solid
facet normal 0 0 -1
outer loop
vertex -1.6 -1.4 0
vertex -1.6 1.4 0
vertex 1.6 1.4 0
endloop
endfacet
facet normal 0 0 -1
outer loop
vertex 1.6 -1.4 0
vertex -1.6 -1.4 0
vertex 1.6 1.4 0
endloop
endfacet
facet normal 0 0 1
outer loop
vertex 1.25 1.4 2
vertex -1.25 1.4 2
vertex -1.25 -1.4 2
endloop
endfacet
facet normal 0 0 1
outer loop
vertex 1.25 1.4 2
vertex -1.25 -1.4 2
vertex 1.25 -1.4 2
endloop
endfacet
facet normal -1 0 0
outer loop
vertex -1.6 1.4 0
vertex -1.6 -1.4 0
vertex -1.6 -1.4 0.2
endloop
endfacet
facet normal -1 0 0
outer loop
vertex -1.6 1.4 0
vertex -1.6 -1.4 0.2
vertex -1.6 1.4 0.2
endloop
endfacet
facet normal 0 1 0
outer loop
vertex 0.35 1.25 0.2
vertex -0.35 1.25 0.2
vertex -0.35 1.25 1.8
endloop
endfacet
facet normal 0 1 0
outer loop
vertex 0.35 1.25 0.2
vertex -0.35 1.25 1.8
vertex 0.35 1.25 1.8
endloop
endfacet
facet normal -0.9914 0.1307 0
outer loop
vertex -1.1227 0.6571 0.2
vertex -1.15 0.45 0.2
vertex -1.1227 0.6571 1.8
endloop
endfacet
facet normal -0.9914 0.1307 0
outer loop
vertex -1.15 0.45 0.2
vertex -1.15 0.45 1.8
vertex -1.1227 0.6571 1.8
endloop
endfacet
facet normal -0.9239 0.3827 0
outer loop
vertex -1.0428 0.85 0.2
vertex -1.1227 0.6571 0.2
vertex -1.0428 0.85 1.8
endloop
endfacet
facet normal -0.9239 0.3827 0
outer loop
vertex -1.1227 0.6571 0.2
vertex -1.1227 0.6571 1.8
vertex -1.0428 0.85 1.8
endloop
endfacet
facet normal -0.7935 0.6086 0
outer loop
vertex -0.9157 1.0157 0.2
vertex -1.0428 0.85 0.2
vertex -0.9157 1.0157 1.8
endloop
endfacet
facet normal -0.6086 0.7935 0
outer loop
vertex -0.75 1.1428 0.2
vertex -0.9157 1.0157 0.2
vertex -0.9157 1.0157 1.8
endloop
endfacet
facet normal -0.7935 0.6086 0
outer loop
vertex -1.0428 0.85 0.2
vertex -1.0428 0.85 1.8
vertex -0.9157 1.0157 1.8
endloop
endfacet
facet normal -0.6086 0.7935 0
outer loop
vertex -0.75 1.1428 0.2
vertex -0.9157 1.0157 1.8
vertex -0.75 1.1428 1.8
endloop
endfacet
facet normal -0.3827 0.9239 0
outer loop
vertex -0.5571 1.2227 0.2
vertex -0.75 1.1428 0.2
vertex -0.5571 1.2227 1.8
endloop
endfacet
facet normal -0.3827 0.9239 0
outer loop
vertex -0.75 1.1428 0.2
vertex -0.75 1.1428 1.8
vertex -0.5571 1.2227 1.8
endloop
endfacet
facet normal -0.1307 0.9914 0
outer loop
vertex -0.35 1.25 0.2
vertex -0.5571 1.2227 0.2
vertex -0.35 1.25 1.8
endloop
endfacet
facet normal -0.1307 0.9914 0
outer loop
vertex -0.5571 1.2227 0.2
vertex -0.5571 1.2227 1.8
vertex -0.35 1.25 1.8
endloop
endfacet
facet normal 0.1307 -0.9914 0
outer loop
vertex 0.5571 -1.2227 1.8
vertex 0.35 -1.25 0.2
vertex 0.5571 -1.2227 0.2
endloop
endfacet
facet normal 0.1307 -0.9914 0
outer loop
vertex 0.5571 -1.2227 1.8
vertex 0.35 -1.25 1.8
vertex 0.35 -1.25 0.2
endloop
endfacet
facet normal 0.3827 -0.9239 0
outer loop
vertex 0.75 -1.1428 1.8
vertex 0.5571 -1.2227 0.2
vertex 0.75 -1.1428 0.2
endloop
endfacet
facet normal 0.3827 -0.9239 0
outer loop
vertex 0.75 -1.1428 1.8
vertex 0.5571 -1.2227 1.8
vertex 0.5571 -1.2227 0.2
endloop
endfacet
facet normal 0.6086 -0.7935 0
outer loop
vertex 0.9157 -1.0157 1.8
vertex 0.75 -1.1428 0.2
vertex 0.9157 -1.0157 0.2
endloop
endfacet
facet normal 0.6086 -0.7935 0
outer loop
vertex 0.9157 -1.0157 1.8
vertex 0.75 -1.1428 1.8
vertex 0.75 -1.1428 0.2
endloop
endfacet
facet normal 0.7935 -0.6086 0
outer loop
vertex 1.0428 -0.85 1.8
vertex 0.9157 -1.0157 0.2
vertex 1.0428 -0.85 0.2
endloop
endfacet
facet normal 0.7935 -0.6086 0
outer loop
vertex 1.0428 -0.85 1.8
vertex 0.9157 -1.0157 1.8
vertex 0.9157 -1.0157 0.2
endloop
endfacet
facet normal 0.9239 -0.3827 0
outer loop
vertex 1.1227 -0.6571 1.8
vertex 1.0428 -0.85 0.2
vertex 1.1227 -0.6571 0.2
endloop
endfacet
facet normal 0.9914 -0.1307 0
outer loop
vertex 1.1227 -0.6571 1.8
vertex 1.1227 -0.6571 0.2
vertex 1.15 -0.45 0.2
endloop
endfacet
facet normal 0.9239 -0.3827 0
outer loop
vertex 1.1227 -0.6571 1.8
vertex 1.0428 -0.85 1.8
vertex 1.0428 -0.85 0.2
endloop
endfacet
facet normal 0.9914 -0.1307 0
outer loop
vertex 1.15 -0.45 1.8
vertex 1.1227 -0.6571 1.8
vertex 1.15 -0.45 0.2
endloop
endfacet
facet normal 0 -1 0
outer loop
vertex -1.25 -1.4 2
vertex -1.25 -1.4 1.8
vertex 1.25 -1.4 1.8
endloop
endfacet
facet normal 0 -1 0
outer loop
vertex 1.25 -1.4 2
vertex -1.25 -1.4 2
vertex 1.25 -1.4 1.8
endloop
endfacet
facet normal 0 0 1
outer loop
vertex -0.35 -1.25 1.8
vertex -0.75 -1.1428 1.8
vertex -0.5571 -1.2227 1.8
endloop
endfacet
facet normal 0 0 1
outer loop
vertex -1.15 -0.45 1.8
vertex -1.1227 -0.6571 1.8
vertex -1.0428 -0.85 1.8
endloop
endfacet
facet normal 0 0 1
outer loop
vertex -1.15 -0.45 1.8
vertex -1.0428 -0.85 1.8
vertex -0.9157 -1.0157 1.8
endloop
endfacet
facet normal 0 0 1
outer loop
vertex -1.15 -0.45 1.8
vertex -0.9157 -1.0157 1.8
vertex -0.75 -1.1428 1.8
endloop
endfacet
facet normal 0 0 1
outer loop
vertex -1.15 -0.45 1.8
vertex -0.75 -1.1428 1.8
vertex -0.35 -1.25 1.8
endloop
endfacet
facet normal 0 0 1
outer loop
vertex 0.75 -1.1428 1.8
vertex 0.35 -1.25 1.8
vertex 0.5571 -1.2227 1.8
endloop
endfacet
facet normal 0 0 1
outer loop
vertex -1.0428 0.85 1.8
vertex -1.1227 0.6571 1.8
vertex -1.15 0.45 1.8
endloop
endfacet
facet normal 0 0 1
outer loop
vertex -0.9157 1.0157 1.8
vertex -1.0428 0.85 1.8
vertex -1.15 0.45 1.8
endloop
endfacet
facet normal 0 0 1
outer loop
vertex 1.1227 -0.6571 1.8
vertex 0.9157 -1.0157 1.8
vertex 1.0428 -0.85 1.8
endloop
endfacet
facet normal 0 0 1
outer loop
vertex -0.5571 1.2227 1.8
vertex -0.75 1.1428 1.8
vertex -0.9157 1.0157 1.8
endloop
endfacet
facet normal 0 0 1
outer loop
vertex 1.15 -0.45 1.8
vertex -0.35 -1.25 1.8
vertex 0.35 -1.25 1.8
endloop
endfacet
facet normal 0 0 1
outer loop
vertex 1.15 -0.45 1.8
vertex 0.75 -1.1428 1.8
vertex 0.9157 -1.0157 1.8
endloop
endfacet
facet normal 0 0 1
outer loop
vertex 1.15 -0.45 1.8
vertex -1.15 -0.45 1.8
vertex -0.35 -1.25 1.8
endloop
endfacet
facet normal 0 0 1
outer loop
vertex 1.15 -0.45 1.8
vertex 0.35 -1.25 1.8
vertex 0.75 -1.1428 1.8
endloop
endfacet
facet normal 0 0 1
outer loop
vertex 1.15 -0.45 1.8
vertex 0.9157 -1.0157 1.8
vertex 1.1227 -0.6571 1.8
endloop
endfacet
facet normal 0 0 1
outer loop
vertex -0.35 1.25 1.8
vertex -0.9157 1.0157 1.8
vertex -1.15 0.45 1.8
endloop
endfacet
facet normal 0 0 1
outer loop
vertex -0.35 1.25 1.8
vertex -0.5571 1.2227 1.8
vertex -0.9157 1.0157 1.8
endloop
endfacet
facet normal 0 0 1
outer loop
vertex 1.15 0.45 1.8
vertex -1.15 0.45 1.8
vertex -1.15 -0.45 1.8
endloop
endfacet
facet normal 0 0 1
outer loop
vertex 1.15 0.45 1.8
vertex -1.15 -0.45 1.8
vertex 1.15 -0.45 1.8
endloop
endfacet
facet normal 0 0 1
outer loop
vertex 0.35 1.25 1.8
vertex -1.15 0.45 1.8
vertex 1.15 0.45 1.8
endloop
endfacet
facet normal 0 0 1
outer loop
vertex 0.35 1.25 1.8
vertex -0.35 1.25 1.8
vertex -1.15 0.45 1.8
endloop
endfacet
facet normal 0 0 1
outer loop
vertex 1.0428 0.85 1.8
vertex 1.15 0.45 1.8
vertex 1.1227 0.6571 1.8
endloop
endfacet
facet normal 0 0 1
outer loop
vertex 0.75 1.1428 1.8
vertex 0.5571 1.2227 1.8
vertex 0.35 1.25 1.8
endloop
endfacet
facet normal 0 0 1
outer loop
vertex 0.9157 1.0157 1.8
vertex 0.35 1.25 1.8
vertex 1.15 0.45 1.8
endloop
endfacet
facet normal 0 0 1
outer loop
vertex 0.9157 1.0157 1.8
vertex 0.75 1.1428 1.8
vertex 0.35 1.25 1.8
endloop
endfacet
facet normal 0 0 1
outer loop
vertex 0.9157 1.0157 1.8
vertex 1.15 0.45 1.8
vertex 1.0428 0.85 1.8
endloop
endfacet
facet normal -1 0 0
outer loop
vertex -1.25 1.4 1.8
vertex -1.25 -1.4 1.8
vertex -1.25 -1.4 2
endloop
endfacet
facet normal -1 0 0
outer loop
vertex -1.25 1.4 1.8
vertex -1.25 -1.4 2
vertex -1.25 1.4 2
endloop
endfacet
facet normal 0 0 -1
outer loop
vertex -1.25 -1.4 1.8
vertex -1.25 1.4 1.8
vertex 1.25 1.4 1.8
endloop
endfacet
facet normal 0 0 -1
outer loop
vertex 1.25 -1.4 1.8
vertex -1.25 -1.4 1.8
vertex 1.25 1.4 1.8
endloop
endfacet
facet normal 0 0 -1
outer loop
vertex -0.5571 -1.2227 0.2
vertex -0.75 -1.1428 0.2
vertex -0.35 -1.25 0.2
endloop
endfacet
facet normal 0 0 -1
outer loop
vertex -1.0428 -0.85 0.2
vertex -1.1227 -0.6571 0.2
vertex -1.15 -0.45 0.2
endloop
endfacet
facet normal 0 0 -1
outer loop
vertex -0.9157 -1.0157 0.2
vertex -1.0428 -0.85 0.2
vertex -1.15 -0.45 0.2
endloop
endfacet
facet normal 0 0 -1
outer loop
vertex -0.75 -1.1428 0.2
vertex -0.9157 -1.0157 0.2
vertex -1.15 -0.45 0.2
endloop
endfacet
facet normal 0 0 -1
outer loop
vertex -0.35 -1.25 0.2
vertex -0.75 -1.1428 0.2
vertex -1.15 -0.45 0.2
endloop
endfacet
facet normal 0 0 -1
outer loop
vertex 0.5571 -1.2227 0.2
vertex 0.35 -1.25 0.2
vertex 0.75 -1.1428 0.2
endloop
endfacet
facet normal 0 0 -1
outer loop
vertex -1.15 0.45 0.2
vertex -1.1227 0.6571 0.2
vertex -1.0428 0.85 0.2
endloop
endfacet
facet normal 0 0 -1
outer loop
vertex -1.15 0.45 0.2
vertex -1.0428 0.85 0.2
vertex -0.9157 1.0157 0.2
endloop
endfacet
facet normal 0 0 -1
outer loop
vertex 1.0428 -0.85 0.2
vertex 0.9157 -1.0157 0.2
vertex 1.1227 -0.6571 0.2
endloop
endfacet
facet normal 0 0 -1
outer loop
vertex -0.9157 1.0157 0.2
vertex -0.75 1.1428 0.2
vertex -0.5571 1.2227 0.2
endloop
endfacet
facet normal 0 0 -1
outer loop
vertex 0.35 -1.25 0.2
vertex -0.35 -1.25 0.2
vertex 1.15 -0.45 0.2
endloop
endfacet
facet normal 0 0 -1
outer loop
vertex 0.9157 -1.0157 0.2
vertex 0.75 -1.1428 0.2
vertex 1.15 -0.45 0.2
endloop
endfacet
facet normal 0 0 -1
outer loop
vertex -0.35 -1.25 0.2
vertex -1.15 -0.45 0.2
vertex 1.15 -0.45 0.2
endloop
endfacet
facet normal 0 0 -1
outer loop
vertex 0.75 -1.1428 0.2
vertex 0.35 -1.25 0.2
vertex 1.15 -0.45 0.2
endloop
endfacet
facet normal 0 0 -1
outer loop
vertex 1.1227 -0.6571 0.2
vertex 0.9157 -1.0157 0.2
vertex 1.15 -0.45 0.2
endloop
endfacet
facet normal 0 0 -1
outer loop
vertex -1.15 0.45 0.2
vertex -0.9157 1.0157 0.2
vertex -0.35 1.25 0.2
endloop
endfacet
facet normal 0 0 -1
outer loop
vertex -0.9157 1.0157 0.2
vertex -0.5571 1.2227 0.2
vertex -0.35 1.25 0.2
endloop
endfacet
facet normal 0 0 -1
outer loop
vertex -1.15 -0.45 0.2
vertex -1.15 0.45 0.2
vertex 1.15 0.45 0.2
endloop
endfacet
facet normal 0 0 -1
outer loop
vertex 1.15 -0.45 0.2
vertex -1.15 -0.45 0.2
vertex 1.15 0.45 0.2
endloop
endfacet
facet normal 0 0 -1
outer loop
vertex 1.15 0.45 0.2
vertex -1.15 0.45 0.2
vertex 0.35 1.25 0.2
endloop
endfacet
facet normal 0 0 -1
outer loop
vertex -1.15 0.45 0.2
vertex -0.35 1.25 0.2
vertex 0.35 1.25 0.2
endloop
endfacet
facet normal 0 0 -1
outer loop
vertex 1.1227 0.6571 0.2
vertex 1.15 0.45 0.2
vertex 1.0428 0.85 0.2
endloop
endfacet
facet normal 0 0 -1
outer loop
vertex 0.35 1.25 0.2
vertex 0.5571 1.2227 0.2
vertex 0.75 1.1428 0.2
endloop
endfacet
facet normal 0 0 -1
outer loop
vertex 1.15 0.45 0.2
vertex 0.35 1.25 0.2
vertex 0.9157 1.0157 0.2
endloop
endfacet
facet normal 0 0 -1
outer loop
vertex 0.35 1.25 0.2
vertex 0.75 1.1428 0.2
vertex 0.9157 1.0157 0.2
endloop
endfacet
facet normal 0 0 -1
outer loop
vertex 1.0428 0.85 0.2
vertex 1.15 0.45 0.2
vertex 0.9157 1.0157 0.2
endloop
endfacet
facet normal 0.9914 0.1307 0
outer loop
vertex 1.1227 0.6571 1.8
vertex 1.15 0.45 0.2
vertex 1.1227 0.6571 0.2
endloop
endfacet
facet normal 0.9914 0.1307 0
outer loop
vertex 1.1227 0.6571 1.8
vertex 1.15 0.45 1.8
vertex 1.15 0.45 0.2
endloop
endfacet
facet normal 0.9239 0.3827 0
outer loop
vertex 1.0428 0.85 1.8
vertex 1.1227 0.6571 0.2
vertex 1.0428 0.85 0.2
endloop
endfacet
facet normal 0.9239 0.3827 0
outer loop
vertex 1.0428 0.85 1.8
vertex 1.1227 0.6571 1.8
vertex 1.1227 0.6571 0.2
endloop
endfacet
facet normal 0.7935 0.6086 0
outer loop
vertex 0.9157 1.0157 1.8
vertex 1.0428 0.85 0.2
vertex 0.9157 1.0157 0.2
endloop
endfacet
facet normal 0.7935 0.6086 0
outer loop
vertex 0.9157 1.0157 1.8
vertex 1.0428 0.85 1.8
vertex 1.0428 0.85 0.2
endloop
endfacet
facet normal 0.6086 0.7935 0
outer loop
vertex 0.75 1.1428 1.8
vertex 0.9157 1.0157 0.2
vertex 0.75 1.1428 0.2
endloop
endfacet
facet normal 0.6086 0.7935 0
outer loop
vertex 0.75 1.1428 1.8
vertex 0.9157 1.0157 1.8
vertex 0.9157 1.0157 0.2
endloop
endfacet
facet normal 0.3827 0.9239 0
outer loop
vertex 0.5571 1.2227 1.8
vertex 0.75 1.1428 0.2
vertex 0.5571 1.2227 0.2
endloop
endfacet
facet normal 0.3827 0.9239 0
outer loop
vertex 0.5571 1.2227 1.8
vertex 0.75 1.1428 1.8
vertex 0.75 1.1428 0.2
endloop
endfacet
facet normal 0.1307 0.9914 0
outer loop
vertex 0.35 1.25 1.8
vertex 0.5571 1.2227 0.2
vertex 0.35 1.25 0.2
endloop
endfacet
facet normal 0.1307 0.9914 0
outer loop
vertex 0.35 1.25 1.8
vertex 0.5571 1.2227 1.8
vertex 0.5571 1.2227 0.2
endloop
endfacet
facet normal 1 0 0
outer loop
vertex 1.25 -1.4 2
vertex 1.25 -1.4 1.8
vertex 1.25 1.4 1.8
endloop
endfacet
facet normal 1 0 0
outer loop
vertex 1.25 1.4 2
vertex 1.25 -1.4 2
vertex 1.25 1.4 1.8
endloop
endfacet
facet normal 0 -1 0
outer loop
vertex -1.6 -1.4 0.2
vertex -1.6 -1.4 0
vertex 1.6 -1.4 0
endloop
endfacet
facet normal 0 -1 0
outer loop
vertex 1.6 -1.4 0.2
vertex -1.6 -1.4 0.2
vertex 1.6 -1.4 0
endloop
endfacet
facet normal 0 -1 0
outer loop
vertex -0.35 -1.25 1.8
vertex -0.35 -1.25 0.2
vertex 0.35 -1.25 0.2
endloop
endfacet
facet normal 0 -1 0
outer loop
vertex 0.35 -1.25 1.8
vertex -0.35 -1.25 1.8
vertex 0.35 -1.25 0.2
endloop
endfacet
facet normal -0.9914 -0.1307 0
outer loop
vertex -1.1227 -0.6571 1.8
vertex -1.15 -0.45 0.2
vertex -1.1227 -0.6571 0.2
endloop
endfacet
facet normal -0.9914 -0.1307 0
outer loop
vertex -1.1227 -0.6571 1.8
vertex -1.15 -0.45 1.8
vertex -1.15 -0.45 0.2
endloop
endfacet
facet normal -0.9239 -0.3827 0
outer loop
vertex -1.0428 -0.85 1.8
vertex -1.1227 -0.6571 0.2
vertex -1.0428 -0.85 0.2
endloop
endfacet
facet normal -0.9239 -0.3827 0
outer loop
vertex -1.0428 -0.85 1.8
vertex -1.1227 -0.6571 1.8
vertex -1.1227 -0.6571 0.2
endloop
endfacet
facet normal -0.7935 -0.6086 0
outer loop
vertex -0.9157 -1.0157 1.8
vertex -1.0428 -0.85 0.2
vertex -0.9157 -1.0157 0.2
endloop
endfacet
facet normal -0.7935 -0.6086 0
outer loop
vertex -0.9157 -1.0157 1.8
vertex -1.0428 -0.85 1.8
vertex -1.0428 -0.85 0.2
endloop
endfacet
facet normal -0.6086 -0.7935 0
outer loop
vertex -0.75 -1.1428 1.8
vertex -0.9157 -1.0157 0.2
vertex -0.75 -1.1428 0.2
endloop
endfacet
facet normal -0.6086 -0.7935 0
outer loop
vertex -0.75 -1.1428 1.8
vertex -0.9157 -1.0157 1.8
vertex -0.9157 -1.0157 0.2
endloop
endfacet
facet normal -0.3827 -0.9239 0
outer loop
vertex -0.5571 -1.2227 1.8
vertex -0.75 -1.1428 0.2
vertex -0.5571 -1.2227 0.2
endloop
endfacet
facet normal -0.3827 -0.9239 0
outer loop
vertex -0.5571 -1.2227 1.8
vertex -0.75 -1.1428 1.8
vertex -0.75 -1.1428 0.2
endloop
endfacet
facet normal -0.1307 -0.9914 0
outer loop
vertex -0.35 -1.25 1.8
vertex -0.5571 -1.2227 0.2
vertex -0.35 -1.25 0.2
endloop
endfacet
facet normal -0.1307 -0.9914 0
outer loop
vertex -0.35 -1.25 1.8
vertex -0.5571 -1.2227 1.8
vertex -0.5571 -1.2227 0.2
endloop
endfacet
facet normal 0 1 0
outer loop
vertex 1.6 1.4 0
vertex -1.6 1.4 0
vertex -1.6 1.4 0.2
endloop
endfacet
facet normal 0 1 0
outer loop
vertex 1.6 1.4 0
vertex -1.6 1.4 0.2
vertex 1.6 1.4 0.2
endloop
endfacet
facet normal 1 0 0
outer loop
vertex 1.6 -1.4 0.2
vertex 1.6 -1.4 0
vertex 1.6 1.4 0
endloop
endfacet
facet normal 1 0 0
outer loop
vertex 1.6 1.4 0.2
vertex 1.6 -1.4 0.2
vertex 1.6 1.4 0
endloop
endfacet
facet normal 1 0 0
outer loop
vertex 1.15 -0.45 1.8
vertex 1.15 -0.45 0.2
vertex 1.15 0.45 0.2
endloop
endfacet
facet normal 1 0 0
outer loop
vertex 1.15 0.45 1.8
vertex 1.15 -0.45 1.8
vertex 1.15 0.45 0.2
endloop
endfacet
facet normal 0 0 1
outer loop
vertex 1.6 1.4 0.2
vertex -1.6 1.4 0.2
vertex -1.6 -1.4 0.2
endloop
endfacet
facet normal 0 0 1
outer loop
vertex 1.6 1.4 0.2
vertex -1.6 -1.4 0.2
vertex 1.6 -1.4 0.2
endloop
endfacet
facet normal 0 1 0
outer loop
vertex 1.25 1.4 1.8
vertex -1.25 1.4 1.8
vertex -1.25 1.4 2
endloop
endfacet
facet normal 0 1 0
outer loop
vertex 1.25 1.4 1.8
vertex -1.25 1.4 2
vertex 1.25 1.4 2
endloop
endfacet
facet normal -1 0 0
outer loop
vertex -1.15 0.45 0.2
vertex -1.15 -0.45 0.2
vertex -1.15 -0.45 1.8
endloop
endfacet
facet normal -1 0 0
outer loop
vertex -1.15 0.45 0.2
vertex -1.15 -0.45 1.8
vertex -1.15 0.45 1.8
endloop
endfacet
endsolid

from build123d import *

# Parameters (mm, degrees)
F0_W     = 3.2
F0_H     = 2.8
F1_DEPTH = 0.2
F2_W     = 2.3
F2_H     = 2.5
F3_DEPTH = 1.6
F4_W     = 2.5
F4_H     = 2.8
F4_W_2   = 2.3
F4_H_2   = 2.5
F5_DEPTH = 0.2
F6_R     = 0.8


with BuildPart() as f1:
    # F0 (on Top) → F1 (new body)
    with BuildSketch(Plane.XY):
        Rectangle(F0_W, F0_H)
    extrude(amount=F1_DEPTH)


with BuildPart() as f3:
    # F2 (on face) → F3 (new body)
    with BuildSketch(Plane.XY.offset(0.2)):
        Rectangle(F2_W, F2_H)
    extrude(amount=F3_DEPTH)

    # F6
    f6_edges = [f3.edges().sort_by_distance(p)[0] for p in [
        (-1.15, -1.25, 1),
        (1.15, -1.25, 1),
        (1.15, 1.25, 1),
        (-1.15, 1.25, 1),
    ]]
    fillet(f6_edges, radius=F6_R)


with BuildPart() as f5:
    # F4 (on face) → F5 (new body)
    with BuildSketch(Plane.XY.offset(1.8)):
        Rectangle(F4_W, F4_H)
        Rectangle(F4_W_2, F4_H_2, mode=Mode.SUBTRACT)
        Rectangle(F4_W_2, F4_H_2)
    extrude(amount=F5_DEPTH)


solid = Compound([f1.part, f3.part, f5.part])
